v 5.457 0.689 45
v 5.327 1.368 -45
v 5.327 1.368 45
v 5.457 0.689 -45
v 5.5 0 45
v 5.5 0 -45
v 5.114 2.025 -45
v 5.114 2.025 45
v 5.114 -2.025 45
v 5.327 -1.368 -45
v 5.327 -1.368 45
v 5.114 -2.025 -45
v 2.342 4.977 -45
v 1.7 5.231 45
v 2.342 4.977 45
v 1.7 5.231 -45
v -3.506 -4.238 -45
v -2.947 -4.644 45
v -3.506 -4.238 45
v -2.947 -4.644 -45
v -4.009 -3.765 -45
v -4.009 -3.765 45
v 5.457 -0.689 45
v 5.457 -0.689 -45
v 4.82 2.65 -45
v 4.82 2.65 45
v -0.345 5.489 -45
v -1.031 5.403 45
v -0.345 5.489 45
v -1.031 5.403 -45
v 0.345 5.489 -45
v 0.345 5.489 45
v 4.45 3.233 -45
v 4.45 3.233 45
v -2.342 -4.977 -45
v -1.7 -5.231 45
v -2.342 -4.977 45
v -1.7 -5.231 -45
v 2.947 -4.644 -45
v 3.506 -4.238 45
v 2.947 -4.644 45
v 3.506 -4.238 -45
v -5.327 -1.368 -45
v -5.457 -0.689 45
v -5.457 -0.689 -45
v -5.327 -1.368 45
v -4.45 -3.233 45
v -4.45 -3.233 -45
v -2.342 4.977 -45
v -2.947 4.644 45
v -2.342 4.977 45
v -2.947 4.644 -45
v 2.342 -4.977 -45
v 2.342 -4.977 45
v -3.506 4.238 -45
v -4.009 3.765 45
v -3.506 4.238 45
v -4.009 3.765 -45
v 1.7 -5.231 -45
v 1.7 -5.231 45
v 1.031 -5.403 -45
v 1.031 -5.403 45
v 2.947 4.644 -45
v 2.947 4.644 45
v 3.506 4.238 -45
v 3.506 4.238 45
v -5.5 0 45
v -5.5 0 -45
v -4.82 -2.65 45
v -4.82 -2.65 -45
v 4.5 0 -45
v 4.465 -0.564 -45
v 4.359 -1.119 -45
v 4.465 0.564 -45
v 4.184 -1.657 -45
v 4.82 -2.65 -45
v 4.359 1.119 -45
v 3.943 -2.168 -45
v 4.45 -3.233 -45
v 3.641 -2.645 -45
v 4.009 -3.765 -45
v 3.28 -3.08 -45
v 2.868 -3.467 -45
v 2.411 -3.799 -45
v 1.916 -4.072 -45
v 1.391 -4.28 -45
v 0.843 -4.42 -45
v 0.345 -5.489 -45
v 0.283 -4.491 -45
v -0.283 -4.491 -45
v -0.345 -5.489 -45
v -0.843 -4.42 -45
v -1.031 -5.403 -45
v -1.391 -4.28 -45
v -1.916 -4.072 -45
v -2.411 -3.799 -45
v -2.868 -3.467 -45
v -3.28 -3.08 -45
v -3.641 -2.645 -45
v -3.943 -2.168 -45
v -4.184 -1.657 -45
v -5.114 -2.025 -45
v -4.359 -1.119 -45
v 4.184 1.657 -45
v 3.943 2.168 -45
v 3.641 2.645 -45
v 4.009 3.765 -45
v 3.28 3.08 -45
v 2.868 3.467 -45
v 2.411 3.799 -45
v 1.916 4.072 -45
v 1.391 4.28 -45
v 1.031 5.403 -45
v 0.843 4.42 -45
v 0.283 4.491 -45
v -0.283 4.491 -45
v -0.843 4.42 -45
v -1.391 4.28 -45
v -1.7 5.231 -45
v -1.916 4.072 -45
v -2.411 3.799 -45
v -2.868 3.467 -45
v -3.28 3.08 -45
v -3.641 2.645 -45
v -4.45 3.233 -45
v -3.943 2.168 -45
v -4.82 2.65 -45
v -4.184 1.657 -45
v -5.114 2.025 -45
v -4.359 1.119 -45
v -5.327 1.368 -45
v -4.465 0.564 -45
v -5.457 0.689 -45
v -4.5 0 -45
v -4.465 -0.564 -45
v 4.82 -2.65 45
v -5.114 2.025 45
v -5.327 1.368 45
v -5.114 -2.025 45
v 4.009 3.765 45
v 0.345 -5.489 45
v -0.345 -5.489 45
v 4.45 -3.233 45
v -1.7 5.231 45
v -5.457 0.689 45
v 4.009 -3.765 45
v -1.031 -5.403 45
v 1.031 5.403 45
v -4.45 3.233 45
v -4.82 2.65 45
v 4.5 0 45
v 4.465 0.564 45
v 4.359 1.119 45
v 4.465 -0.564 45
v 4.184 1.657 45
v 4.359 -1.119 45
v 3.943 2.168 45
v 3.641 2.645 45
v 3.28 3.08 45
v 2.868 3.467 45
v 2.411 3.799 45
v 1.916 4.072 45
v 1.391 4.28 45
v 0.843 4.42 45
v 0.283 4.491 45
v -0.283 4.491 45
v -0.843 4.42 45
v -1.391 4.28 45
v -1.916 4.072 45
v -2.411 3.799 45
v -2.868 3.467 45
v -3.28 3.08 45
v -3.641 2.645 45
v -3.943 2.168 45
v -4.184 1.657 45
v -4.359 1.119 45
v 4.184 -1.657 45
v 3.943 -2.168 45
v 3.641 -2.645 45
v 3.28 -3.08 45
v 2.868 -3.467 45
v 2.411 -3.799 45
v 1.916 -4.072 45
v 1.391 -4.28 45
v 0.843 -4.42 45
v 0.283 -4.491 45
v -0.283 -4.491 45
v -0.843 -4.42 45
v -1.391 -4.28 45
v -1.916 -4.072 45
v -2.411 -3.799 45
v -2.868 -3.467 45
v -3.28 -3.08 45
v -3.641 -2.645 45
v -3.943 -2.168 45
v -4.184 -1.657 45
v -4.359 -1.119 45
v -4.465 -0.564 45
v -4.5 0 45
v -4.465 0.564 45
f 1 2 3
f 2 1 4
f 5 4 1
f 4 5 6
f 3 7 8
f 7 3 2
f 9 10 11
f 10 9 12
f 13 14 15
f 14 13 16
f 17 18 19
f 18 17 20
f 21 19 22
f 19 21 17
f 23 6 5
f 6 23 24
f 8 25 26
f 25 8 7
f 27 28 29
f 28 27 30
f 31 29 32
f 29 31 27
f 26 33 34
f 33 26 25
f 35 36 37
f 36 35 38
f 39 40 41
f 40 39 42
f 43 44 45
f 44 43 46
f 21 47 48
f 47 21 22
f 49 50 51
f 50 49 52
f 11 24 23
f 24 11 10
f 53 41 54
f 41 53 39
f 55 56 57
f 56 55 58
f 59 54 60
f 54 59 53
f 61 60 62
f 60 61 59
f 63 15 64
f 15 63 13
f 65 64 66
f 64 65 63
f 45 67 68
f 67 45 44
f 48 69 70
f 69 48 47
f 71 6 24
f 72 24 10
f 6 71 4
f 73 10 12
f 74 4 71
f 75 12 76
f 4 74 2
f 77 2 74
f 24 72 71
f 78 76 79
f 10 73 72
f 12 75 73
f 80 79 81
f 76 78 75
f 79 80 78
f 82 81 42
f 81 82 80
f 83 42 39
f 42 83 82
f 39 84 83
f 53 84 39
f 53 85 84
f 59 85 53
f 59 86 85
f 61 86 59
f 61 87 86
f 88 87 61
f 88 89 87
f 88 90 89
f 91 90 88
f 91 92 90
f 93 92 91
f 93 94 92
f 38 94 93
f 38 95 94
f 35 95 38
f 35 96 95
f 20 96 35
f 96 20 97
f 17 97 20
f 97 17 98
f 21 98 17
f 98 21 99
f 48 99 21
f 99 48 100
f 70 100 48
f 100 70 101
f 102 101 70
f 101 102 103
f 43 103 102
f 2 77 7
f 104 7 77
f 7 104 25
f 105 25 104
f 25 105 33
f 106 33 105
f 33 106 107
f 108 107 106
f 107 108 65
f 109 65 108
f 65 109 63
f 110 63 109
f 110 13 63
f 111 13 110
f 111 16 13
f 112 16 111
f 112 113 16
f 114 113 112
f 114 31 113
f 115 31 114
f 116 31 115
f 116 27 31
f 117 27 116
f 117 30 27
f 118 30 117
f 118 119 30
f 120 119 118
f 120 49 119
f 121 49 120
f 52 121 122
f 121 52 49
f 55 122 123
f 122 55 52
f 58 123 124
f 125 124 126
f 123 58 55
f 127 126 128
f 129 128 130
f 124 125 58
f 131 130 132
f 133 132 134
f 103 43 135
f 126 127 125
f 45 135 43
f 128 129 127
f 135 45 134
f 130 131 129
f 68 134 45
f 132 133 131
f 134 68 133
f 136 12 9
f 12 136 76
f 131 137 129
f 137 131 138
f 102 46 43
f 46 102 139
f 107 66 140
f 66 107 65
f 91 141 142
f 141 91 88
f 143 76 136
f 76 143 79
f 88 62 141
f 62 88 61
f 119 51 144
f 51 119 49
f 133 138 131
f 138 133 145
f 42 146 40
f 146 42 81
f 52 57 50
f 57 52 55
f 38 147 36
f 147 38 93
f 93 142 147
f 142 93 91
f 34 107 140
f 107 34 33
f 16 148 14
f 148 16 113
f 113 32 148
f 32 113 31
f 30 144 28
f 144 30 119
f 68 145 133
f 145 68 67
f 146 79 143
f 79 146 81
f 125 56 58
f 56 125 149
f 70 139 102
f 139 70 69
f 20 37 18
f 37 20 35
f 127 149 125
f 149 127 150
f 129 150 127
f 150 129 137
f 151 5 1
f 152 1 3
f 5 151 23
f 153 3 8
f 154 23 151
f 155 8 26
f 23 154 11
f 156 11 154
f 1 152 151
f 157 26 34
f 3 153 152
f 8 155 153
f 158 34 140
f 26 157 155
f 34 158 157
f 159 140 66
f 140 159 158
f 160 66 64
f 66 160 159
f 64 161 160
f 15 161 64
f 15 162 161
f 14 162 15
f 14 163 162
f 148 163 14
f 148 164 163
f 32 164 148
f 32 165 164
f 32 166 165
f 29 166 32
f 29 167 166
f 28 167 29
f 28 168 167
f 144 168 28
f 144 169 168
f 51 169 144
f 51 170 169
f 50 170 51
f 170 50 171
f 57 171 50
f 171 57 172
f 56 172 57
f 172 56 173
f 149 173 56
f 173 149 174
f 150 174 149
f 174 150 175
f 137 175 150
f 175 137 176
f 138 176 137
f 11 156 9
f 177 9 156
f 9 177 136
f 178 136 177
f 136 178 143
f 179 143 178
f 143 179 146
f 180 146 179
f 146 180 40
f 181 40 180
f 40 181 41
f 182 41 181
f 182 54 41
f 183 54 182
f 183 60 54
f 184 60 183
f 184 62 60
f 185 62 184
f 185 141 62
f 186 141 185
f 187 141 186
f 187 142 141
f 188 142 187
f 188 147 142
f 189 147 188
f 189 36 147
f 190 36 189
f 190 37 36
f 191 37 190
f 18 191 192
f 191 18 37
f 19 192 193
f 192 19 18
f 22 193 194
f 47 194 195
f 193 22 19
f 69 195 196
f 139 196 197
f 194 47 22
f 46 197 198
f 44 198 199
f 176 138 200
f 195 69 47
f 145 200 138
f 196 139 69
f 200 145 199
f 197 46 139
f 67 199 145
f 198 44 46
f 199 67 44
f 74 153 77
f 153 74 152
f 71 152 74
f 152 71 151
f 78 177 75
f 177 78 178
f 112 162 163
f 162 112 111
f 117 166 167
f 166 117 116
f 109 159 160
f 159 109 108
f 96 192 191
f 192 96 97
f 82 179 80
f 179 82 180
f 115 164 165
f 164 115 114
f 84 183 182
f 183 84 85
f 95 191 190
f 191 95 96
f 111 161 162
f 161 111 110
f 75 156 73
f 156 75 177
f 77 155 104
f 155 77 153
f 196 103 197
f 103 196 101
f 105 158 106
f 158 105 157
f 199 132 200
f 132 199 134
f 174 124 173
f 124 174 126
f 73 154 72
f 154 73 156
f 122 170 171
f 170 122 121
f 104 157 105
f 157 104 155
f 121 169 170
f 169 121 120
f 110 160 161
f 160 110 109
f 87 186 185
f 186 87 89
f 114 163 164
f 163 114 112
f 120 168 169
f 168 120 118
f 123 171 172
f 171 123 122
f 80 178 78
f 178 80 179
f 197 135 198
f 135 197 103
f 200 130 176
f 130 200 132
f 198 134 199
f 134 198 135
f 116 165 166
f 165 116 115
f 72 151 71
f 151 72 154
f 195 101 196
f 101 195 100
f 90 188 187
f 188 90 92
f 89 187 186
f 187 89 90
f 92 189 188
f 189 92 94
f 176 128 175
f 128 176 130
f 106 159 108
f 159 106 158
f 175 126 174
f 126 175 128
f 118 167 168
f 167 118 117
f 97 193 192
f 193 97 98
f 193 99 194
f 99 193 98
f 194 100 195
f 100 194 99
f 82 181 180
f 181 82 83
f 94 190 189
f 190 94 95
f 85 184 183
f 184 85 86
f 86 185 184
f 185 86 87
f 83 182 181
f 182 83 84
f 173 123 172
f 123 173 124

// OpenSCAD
$fn = 50;


difference() {
	union() {
		translate(v = [0, 0, -45.0000000000]) {
			cylinder(h = 90, r = 5.5000000000);
		}
	}
	union() {
		translate(v = [0, 0, -100.0000000000]) {
			cylinder(h = 200, r = 4.5000000000);
		}
	}
}
